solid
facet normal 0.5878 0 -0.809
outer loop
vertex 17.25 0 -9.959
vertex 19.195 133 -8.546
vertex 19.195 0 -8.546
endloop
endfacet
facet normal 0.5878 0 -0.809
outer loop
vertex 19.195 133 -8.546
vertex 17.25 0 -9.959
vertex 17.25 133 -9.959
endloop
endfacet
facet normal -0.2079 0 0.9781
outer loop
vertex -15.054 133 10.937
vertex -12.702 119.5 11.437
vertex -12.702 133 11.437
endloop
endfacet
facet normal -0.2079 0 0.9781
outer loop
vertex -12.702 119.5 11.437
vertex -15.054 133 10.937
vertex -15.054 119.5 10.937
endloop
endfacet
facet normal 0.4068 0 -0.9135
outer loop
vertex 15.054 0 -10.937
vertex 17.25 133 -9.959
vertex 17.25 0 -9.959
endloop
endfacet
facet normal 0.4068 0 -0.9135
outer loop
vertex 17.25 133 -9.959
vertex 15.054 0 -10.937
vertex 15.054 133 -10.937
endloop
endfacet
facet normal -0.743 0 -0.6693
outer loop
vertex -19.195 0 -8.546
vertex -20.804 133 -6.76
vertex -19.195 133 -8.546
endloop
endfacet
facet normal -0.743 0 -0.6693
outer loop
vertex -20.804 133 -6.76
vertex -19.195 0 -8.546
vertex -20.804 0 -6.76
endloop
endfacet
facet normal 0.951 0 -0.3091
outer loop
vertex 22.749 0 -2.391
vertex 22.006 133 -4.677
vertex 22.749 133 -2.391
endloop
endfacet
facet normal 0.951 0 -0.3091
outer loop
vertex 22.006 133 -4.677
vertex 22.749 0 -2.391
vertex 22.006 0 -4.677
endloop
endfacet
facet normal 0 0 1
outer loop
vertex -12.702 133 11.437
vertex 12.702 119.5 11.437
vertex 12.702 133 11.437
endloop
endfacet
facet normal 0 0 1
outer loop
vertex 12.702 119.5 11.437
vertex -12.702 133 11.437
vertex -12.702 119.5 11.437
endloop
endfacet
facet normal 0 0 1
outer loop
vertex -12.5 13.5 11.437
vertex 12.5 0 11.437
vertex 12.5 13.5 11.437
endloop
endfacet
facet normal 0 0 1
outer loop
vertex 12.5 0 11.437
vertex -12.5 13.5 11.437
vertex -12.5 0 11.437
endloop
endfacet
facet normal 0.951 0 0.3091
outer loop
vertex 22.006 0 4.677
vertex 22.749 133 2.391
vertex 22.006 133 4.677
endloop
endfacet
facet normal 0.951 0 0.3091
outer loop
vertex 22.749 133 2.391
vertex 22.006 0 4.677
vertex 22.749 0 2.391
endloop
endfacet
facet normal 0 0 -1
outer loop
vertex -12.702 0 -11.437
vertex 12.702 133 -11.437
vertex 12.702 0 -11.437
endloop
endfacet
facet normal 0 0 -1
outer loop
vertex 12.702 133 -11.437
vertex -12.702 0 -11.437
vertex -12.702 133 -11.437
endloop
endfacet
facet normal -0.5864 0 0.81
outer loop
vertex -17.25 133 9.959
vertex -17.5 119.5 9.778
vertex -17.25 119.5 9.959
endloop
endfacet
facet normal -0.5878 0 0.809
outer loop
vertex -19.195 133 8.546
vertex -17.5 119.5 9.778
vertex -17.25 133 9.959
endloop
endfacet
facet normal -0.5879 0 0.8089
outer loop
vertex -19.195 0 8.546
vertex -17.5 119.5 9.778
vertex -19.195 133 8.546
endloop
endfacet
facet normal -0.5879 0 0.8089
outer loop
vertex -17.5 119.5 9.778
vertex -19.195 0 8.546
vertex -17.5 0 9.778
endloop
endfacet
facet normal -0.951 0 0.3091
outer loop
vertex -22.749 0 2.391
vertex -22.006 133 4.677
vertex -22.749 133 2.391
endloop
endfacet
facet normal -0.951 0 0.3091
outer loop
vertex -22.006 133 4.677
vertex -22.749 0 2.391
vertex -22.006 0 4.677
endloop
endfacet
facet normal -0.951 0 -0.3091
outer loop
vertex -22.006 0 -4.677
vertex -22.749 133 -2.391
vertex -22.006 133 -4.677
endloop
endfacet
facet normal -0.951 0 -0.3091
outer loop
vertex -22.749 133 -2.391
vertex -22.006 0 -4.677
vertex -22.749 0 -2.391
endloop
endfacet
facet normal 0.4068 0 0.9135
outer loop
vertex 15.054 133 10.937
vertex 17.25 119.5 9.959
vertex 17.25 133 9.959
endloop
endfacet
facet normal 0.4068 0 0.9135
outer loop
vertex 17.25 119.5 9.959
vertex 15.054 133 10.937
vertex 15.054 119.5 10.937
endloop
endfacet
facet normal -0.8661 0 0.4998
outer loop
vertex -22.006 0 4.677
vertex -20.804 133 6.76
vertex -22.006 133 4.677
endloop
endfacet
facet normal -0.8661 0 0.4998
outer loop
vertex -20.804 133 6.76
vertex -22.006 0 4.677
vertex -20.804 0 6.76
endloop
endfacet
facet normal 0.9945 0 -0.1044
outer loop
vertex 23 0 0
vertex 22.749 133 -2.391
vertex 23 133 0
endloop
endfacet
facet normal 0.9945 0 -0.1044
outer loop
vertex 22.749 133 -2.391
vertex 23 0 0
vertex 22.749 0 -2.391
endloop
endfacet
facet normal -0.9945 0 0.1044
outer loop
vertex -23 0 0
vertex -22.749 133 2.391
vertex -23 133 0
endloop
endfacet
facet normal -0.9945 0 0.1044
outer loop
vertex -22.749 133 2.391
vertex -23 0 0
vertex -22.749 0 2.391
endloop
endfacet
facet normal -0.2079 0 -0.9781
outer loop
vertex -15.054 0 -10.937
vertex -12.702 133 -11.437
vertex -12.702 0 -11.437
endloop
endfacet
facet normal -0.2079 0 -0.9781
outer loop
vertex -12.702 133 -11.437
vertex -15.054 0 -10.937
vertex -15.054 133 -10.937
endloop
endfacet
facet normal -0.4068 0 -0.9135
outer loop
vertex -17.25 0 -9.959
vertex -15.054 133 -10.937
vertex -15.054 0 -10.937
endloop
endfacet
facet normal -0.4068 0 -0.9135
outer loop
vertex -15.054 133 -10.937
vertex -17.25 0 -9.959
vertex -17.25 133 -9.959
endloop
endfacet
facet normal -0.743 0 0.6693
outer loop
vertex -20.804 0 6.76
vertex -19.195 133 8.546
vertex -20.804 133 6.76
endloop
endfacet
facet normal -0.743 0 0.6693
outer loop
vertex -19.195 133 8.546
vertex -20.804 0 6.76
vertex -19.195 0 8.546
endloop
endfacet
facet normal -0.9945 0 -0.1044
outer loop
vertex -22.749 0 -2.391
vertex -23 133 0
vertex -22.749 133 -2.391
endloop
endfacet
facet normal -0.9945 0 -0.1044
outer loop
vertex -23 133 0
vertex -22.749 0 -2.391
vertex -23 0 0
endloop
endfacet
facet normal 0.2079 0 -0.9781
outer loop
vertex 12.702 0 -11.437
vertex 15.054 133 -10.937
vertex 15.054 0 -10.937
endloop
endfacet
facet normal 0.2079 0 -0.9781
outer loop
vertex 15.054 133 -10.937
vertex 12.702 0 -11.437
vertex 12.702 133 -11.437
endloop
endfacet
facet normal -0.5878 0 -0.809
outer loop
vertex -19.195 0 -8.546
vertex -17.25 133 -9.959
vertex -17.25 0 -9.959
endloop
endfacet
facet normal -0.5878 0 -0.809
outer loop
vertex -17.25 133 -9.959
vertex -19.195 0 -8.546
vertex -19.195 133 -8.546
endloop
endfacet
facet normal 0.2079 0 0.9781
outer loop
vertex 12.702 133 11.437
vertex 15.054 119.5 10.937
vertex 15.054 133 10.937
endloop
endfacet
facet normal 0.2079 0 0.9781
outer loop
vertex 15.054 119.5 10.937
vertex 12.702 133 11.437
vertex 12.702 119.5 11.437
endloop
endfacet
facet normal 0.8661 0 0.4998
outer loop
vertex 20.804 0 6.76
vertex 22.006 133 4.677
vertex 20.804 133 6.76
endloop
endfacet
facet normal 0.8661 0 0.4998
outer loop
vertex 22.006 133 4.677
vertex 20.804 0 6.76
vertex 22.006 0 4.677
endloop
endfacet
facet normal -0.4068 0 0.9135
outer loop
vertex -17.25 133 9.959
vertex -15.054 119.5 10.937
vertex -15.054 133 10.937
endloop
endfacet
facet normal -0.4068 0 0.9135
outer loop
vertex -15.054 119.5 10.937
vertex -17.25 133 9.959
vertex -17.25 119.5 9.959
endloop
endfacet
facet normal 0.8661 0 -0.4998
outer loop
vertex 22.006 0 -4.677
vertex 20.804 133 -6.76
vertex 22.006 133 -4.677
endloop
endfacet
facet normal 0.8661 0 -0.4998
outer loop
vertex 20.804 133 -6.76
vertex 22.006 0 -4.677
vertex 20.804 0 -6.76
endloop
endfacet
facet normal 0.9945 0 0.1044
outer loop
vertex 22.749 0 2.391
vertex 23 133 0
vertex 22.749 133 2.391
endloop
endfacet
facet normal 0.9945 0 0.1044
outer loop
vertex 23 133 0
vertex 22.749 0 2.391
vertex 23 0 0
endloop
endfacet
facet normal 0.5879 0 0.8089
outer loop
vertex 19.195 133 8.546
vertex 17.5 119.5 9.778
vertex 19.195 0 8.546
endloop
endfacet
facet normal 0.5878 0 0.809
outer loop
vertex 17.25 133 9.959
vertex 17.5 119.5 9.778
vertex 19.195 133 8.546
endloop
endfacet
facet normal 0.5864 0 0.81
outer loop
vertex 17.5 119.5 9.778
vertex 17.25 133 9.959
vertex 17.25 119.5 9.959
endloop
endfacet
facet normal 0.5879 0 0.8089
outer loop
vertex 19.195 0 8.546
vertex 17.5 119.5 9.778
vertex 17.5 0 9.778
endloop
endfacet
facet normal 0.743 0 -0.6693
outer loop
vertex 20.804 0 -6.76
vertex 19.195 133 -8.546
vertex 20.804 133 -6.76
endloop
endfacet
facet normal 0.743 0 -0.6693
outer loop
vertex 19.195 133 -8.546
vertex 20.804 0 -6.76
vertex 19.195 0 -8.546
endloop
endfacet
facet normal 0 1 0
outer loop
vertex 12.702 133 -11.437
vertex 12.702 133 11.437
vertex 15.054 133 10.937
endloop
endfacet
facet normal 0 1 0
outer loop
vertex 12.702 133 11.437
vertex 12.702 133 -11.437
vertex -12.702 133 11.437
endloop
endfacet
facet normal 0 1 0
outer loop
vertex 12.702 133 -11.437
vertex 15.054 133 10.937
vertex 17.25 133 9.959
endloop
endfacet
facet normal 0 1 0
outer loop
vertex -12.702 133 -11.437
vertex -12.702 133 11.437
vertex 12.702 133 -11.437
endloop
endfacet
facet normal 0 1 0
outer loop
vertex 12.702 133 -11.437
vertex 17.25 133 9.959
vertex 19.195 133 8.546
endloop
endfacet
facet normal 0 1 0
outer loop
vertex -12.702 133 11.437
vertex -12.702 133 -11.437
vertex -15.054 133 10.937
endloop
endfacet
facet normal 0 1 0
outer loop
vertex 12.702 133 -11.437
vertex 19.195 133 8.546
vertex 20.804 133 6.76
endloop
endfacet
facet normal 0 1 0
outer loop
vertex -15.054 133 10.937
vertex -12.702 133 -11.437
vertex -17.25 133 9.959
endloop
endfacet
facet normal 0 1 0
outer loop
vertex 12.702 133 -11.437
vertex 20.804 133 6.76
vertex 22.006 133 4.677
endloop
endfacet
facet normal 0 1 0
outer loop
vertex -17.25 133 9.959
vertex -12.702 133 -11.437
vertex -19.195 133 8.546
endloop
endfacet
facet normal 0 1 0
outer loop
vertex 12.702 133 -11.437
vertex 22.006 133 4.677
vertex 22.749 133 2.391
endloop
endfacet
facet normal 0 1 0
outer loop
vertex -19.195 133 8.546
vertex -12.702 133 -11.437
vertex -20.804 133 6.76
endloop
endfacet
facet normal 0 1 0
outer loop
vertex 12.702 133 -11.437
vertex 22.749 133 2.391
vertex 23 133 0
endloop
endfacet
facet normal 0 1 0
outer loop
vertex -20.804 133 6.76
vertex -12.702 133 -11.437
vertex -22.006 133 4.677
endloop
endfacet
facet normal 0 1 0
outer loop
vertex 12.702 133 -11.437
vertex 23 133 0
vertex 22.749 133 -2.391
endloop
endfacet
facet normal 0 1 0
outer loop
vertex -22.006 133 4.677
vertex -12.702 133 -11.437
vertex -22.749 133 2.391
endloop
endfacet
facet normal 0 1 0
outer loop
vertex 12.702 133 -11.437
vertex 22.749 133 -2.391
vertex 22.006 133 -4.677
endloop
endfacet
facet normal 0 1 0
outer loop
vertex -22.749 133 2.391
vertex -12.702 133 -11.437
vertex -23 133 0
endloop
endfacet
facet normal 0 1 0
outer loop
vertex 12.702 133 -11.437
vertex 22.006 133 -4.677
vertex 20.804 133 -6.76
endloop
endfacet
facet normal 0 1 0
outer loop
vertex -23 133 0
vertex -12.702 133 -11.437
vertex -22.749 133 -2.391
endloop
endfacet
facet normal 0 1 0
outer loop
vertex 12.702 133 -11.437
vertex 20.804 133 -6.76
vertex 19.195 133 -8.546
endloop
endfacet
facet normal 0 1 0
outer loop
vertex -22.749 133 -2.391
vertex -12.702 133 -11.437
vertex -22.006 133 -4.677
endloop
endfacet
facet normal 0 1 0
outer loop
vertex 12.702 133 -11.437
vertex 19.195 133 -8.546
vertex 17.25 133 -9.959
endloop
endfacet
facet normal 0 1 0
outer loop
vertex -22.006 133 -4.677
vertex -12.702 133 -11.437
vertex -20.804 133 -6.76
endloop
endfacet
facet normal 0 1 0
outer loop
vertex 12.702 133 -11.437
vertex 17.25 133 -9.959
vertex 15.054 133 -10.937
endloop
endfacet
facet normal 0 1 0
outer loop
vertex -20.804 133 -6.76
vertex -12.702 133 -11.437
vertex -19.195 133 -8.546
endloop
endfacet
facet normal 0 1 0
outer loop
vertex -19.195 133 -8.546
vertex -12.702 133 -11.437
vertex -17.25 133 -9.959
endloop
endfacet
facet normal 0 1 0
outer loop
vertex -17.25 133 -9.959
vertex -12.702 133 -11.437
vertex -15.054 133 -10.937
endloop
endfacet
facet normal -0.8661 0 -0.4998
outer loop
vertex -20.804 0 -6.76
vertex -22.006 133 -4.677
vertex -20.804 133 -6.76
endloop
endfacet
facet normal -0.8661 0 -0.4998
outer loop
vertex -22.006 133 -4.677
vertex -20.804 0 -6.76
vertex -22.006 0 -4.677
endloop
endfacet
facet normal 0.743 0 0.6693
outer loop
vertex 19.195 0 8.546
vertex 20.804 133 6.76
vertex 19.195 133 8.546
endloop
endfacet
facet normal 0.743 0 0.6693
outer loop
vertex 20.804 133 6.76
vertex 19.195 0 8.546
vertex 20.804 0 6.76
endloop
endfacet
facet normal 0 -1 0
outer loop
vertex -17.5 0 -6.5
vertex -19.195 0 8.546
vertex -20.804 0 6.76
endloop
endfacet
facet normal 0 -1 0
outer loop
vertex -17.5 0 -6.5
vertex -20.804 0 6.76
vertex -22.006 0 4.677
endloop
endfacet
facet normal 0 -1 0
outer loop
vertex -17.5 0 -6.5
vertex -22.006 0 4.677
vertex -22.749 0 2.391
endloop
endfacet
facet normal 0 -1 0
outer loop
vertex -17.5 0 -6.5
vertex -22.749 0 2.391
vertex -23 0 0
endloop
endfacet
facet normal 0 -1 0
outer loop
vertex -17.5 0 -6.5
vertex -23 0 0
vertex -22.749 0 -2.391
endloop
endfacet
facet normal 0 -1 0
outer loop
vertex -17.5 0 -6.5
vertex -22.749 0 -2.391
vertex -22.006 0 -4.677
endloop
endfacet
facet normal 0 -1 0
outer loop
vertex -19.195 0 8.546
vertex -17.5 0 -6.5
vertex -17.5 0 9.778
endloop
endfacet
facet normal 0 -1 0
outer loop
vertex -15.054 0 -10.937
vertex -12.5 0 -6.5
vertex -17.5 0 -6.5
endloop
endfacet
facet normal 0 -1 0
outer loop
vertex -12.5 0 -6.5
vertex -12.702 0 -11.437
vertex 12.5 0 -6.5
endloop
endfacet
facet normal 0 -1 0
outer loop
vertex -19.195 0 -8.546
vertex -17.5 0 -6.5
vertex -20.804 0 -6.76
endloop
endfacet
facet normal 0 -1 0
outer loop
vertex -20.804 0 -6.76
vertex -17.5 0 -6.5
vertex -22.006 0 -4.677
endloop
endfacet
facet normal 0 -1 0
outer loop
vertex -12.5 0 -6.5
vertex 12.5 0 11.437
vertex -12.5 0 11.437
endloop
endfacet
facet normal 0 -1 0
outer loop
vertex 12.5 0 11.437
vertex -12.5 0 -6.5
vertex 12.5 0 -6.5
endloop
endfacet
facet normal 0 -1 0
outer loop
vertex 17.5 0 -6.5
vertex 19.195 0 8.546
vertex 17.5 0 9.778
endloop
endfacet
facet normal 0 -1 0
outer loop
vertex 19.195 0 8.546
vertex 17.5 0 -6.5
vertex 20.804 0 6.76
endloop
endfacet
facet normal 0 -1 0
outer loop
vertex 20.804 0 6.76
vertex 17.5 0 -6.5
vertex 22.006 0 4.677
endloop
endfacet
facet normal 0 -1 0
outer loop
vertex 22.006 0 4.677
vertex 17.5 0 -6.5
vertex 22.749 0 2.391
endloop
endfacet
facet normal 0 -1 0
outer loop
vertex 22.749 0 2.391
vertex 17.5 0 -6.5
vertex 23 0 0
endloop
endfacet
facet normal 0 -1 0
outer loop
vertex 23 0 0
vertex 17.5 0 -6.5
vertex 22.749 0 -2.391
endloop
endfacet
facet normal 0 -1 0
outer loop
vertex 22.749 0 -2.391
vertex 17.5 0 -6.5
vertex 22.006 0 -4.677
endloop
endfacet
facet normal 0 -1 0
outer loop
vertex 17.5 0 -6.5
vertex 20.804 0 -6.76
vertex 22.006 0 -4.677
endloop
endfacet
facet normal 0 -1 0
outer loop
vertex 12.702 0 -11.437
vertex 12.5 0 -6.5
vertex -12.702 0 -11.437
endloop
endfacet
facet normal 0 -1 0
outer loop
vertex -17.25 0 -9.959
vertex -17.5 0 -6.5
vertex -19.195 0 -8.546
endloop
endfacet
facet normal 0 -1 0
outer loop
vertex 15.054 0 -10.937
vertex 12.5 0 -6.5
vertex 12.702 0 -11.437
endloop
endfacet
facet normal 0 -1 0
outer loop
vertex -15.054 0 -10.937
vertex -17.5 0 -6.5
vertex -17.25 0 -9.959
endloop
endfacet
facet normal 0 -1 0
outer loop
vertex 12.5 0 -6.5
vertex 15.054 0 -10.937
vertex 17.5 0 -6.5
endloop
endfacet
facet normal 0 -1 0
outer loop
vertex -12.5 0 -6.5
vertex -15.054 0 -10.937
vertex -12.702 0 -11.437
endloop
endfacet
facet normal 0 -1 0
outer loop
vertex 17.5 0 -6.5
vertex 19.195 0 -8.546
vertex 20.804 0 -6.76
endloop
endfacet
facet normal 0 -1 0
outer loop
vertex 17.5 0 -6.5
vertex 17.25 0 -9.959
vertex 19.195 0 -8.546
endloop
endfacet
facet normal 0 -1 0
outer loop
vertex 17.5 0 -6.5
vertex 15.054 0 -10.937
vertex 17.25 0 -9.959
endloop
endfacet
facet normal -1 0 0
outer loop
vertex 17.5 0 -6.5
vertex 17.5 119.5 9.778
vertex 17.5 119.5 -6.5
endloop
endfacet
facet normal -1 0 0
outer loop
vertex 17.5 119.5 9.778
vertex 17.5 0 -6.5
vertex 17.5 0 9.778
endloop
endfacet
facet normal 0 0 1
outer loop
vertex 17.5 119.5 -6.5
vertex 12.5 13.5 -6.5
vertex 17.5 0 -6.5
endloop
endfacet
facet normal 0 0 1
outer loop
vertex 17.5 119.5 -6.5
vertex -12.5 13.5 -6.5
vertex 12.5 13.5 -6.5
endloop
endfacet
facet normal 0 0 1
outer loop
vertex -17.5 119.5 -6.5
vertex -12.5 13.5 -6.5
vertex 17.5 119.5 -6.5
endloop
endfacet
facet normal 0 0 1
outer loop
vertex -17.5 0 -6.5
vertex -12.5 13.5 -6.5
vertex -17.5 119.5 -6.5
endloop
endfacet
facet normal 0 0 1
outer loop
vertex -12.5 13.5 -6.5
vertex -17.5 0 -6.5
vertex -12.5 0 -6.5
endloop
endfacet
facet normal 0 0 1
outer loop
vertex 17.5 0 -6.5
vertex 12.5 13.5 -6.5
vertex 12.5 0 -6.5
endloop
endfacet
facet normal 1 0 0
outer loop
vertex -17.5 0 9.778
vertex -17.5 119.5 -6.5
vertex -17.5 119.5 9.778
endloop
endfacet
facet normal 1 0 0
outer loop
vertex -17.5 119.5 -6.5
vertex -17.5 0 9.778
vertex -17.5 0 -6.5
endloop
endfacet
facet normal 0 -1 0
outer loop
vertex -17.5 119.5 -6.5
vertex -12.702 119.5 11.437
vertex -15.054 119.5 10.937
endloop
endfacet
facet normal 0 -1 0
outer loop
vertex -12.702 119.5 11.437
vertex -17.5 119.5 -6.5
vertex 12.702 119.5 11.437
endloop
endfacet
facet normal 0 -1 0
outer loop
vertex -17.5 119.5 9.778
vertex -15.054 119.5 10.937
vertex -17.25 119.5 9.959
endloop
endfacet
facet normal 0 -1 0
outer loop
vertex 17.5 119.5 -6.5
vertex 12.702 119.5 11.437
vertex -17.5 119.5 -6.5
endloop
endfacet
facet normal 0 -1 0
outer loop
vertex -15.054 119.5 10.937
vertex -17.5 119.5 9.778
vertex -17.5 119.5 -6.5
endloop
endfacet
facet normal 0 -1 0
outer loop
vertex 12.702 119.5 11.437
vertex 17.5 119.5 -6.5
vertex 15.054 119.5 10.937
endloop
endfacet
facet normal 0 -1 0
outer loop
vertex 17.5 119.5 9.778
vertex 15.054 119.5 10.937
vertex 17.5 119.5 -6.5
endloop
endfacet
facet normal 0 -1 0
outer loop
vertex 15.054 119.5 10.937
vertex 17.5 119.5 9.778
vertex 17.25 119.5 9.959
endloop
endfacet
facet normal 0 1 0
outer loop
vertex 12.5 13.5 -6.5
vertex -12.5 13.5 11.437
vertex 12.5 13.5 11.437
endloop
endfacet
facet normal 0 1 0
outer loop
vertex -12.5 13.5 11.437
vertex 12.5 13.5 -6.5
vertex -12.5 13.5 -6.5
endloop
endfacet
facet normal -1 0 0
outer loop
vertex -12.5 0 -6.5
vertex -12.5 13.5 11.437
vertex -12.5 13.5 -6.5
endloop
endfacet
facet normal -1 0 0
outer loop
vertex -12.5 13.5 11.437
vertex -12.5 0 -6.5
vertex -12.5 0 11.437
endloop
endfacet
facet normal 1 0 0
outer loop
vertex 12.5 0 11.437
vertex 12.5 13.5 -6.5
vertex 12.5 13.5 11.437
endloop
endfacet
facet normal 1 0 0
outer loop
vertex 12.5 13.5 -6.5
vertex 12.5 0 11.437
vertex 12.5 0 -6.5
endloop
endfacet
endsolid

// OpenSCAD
lipo_length=106;
lipo_height=18;
lipo_width=35;

wire_size=5;

/* [Hidden] */

cell_dia = 23;
cell_length = 133;

difference() {
    //main body is 2x3 nimh sub C size cells
    rotate([-90,0,0]) hull() {
        translate ([-cell_dia/2,0,0])
            cylinder(d=cell_dia, h=cell_length);
        translate ([cell_dia/2,0,0])
            cylinder(d=cell_dia, h=cell_length);
    }
    
    translate([-lipo_width/2, (cell_length-lipo_length)/2, cell_dia/2-lipo_height])
        cube([lipo_width, lipo_length, lipo_height]);
    
    translate([-lipo_width/2,0,cell_dia/2-lipo_height])
            cube([wire_size,(cell_length-lipo_length)/2,cell_dia]);

    translate([lipo_width/2-wire_size,0,cell_dia/2-lipo_height])
            cube([wire_size,(cell_length-lipo_length)/2,cell_dia]);

}
